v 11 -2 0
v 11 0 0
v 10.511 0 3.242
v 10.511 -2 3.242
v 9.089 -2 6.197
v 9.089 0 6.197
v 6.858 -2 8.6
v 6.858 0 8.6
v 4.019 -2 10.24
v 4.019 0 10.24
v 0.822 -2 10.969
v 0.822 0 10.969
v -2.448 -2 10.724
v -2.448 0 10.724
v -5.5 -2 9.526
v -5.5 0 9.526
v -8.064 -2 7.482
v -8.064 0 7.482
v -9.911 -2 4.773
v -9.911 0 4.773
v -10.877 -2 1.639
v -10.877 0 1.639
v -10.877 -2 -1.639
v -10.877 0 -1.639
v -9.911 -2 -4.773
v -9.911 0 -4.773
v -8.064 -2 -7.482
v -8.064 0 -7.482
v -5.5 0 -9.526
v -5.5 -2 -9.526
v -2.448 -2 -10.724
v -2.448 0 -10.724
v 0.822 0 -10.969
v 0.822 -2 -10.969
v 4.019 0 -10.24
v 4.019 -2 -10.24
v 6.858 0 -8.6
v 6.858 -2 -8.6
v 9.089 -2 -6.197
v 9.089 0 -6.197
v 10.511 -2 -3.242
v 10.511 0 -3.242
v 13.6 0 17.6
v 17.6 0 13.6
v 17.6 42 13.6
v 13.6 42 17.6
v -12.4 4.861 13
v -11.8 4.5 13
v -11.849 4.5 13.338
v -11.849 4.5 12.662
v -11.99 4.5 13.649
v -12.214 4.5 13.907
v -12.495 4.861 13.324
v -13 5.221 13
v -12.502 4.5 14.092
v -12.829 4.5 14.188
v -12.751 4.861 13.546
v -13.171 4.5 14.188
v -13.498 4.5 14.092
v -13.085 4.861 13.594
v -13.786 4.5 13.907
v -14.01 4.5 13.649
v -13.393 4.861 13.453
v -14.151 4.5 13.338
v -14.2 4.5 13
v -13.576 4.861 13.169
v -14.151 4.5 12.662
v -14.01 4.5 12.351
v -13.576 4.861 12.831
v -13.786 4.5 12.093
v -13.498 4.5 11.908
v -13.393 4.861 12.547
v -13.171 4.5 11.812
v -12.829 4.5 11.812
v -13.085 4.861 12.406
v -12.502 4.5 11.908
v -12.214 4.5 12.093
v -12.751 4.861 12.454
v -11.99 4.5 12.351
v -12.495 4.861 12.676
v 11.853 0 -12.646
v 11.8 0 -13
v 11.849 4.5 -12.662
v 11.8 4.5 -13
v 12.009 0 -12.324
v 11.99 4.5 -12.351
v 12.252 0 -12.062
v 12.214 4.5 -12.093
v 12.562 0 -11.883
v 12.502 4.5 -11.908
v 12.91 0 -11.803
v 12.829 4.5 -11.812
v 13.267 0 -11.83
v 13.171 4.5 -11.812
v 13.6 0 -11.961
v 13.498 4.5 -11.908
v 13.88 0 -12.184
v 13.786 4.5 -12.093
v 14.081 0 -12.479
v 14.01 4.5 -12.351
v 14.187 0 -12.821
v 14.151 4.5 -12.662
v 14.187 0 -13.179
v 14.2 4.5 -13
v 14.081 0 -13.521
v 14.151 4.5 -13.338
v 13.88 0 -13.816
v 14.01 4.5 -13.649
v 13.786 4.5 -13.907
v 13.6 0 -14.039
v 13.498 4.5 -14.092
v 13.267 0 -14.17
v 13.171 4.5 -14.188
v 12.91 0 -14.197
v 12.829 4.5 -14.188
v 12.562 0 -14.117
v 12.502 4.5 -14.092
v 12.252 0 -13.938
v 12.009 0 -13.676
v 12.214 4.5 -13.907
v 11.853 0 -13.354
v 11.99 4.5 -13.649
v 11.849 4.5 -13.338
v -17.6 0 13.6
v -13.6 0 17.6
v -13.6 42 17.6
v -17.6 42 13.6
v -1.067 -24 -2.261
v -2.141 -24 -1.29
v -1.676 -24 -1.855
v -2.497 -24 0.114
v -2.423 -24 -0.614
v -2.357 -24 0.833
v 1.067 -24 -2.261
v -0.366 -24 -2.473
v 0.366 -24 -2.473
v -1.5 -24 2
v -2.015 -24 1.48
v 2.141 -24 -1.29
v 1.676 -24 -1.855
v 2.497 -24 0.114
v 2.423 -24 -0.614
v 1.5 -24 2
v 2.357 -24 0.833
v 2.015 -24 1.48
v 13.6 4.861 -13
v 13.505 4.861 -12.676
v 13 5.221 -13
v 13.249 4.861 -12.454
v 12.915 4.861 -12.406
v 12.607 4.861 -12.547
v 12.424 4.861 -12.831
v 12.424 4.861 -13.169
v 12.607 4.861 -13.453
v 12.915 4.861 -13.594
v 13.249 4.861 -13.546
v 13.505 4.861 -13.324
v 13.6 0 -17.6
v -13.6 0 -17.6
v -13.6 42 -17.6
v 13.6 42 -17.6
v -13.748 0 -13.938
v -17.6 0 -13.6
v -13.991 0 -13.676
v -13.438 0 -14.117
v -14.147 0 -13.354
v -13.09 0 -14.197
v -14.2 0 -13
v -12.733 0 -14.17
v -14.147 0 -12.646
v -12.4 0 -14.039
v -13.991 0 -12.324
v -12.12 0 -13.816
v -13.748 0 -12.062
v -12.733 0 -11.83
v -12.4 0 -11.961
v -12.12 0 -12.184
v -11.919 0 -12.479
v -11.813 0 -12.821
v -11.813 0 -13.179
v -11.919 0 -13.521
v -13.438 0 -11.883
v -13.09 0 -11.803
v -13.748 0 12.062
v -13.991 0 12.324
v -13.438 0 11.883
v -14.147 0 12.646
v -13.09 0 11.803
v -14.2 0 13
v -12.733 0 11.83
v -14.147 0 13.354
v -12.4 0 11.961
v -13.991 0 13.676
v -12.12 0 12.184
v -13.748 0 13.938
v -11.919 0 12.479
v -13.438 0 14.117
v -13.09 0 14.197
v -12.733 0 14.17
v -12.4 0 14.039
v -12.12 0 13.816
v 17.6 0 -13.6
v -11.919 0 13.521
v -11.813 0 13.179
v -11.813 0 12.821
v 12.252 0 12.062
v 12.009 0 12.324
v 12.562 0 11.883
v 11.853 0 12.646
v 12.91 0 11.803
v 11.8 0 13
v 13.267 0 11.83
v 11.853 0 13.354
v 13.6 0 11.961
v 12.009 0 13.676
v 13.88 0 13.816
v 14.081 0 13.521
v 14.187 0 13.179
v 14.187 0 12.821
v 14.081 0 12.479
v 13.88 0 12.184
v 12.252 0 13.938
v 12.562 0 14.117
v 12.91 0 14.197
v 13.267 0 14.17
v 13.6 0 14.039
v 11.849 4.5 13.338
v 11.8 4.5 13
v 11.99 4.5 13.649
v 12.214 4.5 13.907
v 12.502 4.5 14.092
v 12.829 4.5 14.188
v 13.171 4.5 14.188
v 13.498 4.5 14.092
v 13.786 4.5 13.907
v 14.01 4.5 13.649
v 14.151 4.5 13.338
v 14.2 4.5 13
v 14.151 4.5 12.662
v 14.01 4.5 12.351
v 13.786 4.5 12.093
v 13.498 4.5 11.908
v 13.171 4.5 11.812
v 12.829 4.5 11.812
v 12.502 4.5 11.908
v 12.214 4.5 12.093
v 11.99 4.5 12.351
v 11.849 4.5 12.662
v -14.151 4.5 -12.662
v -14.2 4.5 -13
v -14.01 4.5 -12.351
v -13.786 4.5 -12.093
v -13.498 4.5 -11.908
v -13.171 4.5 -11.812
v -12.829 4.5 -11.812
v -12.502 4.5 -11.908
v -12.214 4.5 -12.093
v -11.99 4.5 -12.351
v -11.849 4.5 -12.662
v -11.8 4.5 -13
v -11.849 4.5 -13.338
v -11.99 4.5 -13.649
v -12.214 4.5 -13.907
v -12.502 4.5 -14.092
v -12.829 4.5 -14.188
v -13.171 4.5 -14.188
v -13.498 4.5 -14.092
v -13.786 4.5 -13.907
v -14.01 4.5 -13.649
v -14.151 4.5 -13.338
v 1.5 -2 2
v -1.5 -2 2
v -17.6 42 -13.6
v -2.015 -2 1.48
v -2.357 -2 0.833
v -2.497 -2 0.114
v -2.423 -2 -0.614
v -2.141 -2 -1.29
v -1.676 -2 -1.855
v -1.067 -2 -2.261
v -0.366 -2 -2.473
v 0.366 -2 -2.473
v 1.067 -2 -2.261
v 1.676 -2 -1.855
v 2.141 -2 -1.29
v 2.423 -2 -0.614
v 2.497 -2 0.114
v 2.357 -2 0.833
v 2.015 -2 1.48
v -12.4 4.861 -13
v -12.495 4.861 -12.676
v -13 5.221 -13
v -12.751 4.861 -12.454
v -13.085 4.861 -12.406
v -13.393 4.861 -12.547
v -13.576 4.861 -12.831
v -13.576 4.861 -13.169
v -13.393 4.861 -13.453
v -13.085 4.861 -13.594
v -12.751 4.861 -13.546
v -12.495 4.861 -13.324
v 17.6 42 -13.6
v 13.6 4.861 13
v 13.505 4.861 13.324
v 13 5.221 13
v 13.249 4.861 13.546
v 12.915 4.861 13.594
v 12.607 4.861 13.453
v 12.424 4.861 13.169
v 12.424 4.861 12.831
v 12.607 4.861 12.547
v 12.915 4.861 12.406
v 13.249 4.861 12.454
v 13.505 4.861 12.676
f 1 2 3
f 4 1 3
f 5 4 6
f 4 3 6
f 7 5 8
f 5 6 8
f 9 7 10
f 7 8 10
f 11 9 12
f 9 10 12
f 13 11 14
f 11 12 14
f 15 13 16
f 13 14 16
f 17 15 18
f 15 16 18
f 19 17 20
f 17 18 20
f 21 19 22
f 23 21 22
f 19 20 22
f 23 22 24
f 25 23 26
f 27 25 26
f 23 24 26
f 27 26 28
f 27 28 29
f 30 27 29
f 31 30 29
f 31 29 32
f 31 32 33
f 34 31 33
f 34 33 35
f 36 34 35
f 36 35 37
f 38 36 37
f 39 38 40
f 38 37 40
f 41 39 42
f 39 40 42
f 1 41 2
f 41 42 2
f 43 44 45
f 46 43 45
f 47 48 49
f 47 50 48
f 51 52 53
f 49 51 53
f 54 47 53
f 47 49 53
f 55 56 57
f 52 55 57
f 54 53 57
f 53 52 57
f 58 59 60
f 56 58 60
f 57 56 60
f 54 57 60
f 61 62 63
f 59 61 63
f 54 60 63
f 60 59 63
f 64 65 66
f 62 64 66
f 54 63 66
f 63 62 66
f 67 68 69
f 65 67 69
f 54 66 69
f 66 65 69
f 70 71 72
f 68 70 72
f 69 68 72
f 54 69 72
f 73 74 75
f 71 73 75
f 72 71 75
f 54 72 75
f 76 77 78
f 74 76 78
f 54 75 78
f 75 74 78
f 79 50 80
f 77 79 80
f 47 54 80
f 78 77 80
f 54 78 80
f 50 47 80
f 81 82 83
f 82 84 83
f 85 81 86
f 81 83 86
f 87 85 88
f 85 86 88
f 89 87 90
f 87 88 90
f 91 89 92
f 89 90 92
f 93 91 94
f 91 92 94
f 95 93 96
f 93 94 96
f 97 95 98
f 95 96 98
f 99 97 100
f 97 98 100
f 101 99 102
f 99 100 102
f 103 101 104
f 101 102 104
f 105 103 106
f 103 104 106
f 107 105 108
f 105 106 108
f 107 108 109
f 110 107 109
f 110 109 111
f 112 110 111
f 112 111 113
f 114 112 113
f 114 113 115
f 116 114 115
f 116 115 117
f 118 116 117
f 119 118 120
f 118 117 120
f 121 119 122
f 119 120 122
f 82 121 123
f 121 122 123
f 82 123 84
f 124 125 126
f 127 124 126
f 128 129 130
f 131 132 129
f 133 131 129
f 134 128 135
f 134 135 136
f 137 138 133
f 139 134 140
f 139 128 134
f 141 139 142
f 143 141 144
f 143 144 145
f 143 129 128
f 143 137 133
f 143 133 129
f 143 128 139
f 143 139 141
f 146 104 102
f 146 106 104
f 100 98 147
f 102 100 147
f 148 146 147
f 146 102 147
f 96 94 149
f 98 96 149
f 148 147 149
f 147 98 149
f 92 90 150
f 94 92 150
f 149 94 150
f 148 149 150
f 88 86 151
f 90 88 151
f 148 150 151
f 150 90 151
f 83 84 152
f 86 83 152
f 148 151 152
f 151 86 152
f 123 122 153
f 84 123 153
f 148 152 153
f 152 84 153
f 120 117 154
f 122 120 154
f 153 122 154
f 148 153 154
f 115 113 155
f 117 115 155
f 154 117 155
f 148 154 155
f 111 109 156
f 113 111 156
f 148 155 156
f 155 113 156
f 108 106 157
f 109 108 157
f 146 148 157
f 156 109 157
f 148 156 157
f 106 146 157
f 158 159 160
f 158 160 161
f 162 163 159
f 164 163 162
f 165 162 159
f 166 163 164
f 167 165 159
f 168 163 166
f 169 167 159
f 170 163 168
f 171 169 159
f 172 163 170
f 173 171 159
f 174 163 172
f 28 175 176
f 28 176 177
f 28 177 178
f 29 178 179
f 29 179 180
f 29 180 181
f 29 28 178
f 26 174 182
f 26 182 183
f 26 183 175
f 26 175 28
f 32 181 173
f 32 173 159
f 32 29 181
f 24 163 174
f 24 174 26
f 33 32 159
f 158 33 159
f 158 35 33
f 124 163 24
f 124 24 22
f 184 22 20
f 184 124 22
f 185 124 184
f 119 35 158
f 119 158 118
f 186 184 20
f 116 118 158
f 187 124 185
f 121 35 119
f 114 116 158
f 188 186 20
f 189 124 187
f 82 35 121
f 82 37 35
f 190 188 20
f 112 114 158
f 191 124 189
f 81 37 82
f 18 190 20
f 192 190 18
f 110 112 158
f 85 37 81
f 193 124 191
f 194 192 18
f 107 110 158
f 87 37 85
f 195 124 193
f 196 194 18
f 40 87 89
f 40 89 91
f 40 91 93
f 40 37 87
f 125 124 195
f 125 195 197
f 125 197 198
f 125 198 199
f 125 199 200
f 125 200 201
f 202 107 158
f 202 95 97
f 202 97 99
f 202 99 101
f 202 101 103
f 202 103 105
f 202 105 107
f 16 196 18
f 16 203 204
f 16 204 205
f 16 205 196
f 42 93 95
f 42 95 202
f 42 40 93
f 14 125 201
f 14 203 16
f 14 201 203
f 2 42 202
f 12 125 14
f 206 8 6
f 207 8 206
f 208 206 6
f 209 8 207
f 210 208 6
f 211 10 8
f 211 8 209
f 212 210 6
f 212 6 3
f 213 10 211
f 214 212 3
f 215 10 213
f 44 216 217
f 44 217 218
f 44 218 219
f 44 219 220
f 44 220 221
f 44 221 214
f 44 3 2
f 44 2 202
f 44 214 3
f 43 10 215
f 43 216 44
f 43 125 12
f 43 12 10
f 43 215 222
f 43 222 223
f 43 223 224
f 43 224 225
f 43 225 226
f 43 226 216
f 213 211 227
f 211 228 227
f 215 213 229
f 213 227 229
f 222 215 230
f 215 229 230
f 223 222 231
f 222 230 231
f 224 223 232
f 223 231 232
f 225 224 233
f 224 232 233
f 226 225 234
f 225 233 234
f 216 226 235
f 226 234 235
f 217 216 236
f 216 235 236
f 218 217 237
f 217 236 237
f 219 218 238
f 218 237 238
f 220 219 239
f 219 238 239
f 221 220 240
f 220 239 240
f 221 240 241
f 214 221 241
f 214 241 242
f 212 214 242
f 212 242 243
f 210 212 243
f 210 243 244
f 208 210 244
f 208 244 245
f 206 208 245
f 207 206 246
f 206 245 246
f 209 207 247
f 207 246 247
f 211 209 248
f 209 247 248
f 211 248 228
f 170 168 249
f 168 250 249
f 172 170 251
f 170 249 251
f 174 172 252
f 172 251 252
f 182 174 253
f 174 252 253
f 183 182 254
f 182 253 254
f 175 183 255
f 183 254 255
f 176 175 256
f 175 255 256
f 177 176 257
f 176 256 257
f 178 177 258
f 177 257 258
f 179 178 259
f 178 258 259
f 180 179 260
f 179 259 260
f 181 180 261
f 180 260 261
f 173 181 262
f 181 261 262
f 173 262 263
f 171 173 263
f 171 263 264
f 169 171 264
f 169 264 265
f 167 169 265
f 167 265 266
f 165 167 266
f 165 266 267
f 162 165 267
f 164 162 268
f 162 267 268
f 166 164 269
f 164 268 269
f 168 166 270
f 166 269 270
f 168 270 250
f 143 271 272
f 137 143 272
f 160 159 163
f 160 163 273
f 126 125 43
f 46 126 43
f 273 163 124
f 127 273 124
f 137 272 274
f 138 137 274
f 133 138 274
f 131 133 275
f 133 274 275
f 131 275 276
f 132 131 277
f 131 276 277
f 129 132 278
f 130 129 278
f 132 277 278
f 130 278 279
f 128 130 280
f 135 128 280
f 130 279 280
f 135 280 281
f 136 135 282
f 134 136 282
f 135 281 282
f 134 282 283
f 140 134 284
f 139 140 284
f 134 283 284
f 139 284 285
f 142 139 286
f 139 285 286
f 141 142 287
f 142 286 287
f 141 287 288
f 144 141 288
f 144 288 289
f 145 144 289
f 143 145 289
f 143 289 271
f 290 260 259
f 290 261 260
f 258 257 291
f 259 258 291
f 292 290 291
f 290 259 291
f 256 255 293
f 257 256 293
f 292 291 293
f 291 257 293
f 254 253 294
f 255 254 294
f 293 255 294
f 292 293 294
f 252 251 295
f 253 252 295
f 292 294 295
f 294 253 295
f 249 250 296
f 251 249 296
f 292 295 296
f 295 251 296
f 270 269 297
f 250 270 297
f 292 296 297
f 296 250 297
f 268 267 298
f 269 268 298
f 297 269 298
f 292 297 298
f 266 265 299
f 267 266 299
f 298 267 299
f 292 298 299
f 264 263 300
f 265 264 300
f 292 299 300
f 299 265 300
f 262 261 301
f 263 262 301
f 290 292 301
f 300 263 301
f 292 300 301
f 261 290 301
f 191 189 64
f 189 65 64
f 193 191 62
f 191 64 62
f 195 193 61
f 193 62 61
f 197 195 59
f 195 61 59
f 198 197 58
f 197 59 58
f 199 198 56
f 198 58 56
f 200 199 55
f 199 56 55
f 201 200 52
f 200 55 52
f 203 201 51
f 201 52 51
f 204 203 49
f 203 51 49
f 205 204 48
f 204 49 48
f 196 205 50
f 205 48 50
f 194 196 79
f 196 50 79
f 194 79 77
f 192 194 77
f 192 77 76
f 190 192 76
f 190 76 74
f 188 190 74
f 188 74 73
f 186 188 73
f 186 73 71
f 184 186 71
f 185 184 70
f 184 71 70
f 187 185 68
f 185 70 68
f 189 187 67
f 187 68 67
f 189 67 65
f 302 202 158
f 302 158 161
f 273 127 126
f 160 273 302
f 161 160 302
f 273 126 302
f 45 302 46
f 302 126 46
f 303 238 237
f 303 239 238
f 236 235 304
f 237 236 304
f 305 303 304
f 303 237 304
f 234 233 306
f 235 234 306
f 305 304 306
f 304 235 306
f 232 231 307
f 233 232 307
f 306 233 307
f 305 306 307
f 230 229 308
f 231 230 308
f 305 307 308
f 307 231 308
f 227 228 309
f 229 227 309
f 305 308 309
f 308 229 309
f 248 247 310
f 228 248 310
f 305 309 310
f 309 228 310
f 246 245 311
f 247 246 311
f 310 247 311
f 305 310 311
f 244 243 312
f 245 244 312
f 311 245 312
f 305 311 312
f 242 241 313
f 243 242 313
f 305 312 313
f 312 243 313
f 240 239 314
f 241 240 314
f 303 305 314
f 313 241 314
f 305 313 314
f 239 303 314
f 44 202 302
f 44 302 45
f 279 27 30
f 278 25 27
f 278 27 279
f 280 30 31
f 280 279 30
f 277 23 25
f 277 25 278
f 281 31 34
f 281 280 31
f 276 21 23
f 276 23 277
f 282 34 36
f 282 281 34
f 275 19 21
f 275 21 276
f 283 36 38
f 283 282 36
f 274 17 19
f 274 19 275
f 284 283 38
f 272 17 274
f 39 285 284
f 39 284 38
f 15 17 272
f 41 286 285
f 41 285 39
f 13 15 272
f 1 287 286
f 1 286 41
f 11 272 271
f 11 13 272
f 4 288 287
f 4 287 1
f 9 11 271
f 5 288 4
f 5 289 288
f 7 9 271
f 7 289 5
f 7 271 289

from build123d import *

# Parameters (mm, degrees)
F0_W     = 35.2
F0_H     = 35.2
F1_DEPTH = 42
F2_R     = 11
F3_DEPTH = 2
F5_DEPTH = 22
F7_D     = 2.4
F7_DEPTH = 4.5
F7_TIP   = 0.7210327428
F8_SIZE  = 4


with BuildPart() as f1:
    # F0 (on Front) → F1 (new body)
    with BuildSketch(Plane.XZ):
        Rectangle(F0_W, F0_H)
    extrude(amount=-F1_DEPTH)

    # F2 (on Front) → F3 (join)
    with BuildSketch(Plane.XZ):
        Circle(F2_R)
    extrude(amount=F3_DEPTH)

    # F4 (on face) → F5 (join)
    with BuildSketch(Plane.XZ.offset(2)):
        with BuildLine():
            Line((1.5, 2), (-1.5, 2))
            ThreePointArc((-1.5, 2), (0, -2.5), (1.5, 2))
        make_face()
    extrude(amount=F5_DEPTH)

    # F7
    with Locations(Plane.XZ):
        with Locations((-13, 13), (13, 13), (13, -13), (-13, -13)):
            Hole(F7_D / 2, depth=F7_DEPTH)
            with Locations((0, 0, -(F7_DEPTH + F7_TIP / 2))):  # 118° drill point
                Cone(0, F7_D / 2, F7_TIP, mode=Mode.SUBTRACT)

    # F8
    f8_edges = [f1.edges().sort_by_distance(p)[0] for p in [
        (-17.6, 21, 17.6),
        (-17.6, 21, -17.6),
        (17.6, 21, -17.6),
        (17.6, 21, 17.6),
    ]]
    chamfer(f8_edges, length=F8_SIZE)


solid = f1.part
